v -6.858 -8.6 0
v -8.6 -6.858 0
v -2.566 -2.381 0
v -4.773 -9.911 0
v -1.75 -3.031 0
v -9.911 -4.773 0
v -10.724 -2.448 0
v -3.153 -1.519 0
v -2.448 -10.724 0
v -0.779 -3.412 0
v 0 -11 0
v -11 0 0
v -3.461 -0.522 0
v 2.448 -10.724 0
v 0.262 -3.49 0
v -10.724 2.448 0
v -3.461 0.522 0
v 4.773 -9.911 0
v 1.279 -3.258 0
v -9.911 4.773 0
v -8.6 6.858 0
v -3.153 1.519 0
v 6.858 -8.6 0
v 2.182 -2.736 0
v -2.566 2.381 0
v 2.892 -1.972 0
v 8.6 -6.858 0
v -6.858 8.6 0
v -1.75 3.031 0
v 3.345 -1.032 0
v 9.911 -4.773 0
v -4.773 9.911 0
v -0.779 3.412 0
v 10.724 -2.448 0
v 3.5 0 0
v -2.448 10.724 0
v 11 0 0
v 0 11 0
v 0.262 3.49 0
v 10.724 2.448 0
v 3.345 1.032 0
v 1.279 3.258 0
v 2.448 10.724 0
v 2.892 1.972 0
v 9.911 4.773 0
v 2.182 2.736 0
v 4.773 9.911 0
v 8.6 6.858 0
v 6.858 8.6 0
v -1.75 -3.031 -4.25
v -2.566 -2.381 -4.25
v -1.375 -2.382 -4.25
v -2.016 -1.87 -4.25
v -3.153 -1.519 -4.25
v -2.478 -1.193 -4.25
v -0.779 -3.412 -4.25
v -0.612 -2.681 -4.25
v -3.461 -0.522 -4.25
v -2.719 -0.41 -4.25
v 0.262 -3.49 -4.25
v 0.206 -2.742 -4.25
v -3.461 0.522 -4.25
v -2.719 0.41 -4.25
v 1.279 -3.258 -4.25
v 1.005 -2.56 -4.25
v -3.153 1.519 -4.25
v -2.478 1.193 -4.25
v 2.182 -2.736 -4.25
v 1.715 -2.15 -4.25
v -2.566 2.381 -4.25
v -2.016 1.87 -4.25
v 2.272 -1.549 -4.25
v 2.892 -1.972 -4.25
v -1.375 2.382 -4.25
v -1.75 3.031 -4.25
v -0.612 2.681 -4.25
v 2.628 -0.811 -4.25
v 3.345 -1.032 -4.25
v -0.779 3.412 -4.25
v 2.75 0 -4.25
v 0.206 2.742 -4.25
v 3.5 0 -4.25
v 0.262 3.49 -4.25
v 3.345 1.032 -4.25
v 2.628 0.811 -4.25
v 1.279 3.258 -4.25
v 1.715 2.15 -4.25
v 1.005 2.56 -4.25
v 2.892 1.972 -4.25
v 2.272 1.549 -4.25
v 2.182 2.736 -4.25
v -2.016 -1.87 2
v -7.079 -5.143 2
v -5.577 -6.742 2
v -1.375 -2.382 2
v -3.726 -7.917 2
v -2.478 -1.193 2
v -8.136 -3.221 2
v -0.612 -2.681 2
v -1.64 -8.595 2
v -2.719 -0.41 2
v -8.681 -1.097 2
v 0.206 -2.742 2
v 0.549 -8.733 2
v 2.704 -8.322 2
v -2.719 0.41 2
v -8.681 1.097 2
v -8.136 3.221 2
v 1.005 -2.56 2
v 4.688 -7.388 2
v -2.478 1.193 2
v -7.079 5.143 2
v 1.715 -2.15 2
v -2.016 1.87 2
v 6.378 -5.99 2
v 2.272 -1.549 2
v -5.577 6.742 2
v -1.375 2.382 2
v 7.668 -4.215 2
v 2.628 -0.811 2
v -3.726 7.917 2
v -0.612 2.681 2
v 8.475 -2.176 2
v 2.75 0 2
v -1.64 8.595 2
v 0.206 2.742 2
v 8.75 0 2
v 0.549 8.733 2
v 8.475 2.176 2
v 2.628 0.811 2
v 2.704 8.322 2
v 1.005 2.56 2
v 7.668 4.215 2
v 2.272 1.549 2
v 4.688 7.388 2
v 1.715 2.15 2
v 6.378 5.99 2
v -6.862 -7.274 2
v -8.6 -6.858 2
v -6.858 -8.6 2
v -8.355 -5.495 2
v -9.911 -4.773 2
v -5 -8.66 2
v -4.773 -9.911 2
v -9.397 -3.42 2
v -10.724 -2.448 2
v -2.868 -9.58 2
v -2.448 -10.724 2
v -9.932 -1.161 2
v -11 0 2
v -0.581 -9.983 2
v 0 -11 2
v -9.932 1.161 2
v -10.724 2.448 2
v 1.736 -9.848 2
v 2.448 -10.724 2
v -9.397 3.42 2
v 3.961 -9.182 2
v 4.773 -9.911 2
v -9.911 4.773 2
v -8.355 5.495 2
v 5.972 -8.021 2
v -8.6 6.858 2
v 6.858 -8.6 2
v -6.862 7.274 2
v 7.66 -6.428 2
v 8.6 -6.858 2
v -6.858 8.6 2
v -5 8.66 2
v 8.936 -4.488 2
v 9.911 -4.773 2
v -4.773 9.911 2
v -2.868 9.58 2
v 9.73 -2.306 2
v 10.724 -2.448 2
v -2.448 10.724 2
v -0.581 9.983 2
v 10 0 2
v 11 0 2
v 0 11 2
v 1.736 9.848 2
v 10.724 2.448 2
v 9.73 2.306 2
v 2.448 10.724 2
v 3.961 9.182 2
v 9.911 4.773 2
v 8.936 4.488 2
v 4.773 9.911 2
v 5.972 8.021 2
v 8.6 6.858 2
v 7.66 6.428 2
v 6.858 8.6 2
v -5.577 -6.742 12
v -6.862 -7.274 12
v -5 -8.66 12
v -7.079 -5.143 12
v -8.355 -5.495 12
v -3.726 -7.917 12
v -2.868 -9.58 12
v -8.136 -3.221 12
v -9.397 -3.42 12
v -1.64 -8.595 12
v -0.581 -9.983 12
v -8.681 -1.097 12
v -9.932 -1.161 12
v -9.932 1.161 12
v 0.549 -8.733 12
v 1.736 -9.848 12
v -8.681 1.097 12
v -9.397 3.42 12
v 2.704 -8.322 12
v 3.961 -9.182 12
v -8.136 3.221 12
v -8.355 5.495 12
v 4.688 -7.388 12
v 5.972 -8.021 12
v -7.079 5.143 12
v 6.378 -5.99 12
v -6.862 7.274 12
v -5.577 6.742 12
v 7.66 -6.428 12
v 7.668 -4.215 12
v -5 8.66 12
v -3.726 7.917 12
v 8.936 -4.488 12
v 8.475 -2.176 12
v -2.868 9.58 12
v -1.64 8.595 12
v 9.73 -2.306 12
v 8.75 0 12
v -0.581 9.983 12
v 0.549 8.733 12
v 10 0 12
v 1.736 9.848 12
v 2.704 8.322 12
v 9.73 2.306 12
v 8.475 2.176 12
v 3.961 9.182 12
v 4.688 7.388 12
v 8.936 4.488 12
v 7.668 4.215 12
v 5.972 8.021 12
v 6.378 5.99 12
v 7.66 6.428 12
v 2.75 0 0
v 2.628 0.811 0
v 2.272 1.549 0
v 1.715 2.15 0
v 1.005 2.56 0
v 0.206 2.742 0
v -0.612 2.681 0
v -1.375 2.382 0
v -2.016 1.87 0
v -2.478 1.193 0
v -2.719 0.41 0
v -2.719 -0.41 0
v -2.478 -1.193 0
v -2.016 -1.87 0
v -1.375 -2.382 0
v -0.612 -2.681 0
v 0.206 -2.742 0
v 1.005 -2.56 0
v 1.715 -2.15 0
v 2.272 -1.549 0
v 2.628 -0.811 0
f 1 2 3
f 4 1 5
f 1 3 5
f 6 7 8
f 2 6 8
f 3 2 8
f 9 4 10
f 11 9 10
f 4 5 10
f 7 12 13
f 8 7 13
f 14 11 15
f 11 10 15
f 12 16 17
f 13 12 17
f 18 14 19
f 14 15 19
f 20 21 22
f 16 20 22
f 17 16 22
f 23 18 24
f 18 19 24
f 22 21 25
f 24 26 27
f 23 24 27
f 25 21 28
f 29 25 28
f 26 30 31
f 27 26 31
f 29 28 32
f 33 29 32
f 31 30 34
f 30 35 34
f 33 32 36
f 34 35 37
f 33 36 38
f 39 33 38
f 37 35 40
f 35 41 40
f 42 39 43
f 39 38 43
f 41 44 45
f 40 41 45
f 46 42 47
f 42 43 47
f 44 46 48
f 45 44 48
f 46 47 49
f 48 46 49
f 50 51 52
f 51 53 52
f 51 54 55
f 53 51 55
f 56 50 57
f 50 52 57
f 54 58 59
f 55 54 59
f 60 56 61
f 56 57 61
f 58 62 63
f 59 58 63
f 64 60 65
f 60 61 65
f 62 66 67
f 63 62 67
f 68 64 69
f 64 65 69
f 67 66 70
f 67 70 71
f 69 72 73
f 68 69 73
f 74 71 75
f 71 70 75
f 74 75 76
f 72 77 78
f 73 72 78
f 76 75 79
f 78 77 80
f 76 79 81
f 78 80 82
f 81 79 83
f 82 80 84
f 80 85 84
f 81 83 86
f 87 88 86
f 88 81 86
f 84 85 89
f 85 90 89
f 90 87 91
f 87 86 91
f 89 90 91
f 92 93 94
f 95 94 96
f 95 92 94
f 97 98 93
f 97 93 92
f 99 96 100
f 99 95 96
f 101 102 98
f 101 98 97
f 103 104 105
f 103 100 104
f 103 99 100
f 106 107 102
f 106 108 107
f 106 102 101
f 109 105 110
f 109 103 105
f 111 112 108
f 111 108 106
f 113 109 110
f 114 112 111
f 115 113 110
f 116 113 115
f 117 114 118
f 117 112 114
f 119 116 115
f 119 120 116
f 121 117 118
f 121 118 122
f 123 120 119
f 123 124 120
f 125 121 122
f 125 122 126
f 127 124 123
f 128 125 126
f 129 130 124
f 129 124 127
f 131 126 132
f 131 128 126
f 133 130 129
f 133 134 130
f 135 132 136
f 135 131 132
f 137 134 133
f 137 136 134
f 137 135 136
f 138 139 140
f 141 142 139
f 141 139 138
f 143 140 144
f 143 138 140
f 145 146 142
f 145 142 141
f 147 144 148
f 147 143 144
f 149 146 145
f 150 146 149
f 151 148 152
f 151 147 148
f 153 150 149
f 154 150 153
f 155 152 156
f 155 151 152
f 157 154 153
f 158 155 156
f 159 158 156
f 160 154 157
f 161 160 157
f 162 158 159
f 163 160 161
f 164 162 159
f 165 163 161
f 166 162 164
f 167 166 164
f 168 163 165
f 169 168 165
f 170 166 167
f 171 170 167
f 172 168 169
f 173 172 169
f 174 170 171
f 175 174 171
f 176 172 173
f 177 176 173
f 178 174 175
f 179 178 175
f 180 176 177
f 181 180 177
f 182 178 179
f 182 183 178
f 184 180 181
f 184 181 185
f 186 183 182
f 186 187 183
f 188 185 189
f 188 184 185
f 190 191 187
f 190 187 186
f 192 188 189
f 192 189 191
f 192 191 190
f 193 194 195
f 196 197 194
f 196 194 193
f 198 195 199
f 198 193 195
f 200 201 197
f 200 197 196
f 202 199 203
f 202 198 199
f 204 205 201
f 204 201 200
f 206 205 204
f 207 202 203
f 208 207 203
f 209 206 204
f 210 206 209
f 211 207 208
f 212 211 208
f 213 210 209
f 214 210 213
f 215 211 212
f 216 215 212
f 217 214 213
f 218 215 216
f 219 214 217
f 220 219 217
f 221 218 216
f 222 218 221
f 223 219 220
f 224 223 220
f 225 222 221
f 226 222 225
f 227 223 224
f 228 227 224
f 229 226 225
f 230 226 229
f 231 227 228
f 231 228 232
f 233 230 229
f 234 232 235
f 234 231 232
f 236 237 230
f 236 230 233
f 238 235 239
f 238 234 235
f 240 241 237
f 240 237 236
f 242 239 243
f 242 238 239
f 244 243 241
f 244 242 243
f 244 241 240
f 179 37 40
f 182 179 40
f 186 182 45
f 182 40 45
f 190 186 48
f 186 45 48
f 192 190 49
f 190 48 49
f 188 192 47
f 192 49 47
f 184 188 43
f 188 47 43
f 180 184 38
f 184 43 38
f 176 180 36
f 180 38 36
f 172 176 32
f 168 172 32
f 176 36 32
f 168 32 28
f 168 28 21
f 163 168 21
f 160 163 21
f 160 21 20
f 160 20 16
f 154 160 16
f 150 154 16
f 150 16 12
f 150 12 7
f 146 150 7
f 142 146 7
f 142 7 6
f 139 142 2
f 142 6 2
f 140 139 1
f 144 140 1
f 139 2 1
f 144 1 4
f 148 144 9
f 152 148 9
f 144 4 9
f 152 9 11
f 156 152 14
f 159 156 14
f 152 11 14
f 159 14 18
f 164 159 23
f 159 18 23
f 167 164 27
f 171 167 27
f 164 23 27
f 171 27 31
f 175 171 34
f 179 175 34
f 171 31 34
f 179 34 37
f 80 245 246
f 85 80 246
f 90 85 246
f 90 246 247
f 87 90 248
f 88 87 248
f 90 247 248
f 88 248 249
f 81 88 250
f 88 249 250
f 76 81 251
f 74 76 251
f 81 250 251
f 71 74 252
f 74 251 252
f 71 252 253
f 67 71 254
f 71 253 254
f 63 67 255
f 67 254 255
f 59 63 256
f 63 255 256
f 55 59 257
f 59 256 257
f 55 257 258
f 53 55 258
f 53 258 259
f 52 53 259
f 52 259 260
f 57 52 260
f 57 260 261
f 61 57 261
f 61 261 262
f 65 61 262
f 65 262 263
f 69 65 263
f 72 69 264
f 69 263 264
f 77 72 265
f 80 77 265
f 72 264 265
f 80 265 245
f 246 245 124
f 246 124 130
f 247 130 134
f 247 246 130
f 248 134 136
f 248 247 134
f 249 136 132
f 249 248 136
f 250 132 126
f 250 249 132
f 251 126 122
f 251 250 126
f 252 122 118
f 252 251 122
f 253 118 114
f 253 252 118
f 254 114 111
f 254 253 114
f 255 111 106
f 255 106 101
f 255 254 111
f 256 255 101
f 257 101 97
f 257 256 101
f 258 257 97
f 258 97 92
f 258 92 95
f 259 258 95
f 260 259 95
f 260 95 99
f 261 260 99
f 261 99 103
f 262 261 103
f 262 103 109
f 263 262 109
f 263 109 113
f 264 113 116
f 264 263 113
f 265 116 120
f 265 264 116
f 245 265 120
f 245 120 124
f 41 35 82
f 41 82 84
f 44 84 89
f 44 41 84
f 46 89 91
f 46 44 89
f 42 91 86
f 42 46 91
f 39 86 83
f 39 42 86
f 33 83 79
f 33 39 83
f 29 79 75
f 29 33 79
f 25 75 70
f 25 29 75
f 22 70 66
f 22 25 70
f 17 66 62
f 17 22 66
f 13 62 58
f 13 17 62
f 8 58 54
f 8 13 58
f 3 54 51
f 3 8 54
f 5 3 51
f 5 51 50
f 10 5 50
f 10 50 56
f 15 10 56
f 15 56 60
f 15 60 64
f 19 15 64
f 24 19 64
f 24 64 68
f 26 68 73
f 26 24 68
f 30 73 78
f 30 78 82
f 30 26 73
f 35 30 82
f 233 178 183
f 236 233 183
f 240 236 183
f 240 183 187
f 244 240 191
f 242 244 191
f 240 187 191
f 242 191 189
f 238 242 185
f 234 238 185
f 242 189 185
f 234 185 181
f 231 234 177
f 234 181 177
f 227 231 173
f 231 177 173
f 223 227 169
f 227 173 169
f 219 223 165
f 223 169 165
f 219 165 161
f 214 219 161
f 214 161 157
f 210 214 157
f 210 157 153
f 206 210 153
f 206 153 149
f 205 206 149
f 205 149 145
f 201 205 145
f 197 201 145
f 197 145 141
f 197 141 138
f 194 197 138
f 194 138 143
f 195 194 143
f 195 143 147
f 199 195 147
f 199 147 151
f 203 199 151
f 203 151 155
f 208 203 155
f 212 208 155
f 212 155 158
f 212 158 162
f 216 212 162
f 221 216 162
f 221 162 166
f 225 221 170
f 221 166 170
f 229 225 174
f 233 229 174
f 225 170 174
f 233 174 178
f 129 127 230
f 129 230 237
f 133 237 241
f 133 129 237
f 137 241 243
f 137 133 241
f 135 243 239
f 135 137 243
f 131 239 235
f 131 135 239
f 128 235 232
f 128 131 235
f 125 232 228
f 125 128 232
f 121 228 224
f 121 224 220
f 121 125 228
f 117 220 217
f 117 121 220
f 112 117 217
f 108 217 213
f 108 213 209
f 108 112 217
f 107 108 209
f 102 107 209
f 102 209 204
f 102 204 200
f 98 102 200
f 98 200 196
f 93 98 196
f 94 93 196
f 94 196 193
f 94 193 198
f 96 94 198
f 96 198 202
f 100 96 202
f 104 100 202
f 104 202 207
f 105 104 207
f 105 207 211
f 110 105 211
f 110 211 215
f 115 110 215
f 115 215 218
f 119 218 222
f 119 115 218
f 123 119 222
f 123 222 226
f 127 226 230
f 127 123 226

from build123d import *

# Parameters (mm, degrees)
F0_R     = 11
F0_R_2   = 10
F0_R_3   = 8.75
F0_R_4   = 7.25
F0_R_5   = 3.5
F0_R_6   = 2.75
F1_DEPTH = 2
F2_DEPTH = 4.25
F3_DEPTH = 12


with BuildPart() as f1:
    # F0 (on Top) → F1 (new body)
    with BuildSketch(Plane.XY):
        Circle(F0_R)
        Circle(F0_R_2, mode=Mode.SUBTRACT)
        Circle(F0_R_2)
        Circle(F0_R_3, mode=Mode.SUBTRACT)
        Circle(F0_R_3)
        Circle(F0_R_4, mode=Mode.SUBTRACT)
        Circle(F0_R_4)
        Circle(F0_R_5, mode=Mode.SUBTRACT)
        Circle(F0_R_5)
        Circle(F0_R_6, mode=Mode.SUBTRACT)
    extrude(amount=F1_DEPTH)

    # F0 (on Top) → F2 (join)
    with BuildSketch(Plane.XY):
        Circle(F0_R_5)
        Circle(F0_R_6, mode=Mode.SUBTRACT)
    extrude(amount=-F2_DEPTH)

    # F0 (on Top) → F3 (join)
    with BuildSketch(Plane.XY):
        Circle(F0_R_2)
        Circle(F0_R_3, mode=Mode.SUBTRACT)
    extrude(amount=F3_DEPTH)


solid = f1.part
